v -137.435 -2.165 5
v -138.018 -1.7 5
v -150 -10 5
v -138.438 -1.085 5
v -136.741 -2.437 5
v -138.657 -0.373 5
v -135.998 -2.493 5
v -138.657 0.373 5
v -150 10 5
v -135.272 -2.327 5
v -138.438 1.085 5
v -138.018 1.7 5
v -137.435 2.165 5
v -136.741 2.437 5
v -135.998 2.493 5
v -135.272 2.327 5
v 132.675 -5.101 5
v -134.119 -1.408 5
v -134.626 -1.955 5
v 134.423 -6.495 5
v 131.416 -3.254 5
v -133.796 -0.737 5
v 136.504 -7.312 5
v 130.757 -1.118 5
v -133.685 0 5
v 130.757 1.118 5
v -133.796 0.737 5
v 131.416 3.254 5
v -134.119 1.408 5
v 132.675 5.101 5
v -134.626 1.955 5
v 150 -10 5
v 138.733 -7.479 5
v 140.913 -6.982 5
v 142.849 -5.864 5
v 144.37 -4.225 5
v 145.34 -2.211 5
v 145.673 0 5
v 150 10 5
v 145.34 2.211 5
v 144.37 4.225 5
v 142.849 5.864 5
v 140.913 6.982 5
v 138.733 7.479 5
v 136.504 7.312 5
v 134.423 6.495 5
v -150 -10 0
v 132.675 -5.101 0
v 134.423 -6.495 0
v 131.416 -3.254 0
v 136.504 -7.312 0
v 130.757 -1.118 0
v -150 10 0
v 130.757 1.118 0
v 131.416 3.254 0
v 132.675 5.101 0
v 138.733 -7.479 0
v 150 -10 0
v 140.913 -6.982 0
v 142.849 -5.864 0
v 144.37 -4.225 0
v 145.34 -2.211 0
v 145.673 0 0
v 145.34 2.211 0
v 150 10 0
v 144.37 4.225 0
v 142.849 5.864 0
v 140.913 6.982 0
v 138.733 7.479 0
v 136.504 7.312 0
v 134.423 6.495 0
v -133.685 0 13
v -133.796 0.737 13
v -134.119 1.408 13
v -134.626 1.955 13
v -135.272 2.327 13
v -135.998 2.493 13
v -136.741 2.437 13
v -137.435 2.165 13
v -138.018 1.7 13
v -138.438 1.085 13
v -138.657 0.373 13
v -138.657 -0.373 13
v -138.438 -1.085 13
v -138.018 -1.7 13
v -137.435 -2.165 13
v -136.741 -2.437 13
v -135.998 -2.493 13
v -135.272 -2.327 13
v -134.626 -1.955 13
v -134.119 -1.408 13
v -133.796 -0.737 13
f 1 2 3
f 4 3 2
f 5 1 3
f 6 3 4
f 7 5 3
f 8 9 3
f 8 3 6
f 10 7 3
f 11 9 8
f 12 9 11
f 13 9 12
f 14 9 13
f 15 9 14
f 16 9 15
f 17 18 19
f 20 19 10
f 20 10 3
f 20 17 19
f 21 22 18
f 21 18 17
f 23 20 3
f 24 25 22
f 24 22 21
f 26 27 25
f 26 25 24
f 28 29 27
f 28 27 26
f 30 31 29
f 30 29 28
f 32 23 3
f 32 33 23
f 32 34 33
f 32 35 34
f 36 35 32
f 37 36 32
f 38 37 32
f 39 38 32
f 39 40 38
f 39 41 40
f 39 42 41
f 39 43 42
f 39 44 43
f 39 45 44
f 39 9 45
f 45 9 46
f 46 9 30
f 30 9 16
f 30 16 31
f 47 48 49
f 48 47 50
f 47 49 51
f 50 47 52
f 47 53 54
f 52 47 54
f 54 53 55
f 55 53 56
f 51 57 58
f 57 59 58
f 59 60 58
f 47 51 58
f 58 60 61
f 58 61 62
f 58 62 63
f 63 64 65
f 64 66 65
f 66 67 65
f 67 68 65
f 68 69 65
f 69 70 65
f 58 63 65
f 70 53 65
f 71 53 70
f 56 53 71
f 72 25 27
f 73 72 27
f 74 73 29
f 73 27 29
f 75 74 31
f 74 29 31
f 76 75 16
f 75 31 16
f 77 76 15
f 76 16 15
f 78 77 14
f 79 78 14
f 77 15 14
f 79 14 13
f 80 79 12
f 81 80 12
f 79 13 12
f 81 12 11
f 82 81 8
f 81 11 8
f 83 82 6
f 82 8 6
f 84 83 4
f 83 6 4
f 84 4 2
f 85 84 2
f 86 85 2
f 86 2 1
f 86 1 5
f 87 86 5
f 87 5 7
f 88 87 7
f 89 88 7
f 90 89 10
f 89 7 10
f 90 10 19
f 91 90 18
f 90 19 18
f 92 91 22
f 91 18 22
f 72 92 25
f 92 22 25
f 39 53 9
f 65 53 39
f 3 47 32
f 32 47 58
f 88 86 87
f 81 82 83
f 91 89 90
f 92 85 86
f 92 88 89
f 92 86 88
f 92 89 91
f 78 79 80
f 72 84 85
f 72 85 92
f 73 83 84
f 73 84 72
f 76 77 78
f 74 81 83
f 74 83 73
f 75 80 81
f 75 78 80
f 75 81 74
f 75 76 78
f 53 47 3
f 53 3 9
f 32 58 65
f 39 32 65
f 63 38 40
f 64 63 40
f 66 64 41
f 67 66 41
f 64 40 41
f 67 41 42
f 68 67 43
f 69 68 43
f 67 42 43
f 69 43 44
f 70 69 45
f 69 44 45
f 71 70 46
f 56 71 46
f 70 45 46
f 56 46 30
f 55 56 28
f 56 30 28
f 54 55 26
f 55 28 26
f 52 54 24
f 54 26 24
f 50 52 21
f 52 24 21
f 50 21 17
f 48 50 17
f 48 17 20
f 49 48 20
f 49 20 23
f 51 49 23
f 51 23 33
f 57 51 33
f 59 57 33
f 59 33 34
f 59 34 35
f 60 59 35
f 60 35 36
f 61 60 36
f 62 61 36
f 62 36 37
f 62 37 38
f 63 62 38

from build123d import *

# Parameters (mm, degrees)
SKETCH1_W           = 300
SKETCH1_H           = 20
BOSS_EXTRUDE1_DEPTH = 5
SKETCH2_R           = 7.5
CUT_EXTRUDE1_DEPTH  = 151.416089565
SKETCH3_R           = 2.5
BOSS_EXTRUDE2_DEPTH = 8


with BuildPart() as part:
    # Sketch1 → Boss-Extrude1 (new body)
    with BuildSketch(Plane.XY):
        Rectangle(SKETCH1_W, SKETCH1_H)
    extrude(amount=BOSS_EXTRUDE1_DEPTH)

    # Sketch2 → Cut-Extrude1 (cut, through all)
    with BuildSketch(Plane.XY.offset(5)):
        with Locations((138.172978114, 0)):
            Circle(SKETCH2_R)
    extrude(amount=-CUT_EXTRUDE1_DEPTH, mode=Mode.SUBTRACT)

    # Sketch3 → Boss-Extrude2 (add)
    with BuildSketch(Plane.XY.offset(5)):
        with Locations((-136.185092233, 0)):
            Circle(SKETCH3_R)
    extrude(amount=BOSS_EXTRUDE2_DEPTH)


solid = part.part
